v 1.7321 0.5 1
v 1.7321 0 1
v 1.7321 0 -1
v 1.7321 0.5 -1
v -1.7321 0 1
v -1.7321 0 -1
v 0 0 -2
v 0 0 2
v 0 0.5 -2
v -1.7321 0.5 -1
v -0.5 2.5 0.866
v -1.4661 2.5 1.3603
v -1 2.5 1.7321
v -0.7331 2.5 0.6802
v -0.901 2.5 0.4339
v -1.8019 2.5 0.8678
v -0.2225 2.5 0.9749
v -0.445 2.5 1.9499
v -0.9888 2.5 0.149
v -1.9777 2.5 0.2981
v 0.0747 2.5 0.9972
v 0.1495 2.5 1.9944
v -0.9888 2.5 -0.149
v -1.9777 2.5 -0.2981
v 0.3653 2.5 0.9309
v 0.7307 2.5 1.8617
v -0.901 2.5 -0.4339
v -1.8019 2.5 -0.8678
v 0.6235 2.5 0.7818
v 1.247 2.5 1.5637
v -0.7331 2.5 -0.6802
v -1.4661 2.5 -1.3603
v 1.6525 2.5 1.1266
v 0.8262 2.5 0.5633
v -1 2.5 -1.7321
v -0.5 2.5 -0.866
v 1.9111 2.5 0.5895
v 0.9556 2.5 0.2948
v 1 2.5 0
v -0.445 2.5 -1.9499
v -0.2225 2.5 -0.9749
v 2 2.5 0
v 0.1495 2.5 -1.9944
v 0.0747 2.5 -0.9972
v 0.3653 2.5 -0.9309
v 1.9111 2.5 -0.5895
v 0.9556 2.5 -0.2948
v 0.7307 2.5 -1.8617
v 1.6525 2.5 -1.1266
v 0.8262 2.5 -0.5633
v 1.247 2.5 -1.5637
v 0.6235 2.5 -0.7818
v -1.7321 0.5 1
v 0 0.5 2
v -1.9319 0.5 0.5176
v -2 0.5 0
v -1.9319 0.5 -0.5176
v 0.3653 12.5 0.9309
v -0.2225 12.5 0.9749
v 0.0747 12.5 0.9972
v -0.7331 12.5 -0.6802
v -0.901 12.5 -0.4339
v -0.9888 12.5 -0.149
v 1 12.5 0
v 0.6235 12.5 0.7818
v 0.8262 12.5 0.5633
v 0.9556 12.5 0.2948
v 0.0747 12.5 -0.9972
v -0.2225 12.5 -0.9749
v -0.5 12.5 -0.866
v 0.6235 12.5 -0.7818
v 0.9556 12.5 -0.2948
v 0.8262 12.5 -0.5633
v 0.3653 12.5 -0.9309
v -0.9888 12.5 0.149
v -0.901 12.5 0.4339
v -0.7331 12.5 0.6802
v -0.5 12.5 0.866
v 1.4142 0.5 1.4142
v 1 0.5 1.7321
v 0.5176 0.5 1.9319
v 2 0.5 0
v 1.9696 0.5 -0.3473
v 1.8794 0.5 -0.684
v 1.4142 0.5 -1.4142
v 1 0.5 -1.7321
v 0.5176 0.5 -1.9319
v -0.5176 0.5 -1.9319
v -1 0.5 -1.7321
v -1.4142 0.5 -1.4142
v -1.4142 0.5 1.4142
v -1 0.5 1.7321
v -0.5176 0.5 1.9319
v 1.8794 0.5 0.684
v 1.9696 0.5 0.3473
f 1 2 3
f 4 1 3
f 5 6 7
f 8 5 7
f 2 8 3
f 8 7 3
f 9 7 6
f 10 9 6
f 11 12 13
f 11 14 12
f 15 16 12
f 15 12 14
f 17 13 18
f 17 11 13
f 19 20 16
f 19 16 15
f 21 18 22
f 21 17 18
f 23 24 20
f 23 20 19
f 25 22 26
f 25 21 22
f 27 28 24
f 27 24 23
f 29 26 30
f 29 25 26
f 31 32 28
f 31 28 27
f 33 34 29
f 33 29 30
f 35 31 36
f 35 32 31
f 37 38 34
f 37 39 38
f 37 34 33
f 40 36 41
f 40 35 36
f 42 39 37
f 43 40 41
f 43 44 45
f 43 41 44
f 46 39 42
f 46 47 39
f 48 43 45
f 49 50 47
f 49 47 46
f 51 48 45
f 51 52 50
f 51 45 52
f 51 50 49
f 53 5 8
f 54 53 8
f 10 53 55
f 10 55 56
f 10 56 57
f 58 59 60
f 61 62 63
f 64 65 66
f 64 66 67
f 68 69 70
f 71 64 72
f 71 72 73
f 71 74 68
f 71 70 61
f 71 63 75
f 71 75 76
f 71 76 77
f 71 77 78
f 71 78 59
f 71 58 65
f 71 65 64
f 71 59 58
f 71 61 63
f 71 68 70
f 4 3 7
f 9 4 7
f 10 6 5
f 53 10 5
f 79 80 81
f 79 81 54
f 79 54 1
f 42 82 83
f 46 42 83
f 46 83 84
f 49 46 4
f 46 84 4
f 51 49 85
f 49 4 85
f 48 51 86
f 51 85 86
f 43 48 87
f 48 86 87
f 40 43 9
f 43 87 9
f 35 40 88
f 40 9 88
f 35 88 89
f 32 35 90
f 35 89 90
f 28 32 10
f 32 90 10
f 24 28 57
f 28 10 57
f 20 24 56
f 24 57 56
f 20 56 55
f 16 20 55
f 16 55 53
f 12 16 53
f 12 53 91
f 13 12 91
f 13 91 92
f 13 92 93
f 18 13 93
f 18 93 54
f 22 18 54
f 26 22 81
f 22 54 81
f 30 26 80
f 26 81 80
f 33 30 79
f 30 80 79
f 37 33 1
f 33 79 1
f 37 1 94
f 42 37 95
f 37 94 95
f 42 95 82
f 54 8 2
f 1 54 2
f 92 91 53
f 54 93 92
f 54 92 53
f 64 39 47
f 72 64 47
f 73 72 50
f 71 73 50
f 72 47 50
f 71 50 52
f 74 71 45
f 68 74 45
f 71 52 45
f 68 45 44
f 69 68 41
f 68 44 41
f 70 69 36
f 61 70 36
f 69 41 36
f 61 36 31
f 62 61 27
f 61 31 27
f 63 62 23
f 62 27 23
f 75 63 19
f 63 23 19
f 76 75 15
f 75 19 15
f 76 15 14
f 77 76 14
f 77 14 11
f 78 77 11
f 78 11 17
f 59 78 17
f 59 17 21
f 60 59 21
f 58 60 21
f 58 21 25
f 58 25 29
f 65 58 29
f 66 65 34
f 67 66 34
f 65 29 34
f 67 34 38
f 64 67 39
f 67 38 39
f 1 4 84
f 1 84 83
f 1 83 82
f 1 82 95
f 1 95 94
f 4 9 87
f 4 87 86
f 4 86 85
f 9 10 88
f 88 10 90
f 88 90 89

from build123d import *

# Parameters (mm, degrees)
SKETCH1_R           = 2
BOSS_EXTRUDE1_DEPTH = 2.5
SKETCH2_R           = 1
BOSS_EXTRUDE2_DEPTH = 10
CUT_EXTRUDE3_DEPTH  = 0.5


with BuildPart() as part:
    # Sketch1 → Boss-Extrude1 (new body)
    with BuildSketch(Plane(origin=(0, 0, 0), x_dir=(1, 0, 0), z_dir=(0, 1, 0))):
        Circle(SKETCH1_R)
    extrude(amount=BOSS_EXTRUDE1_DEPTH)

    # Sketch2 → Boss-Extrude2 (add)
    with BuildSketch(Plane(origin=(0, 2.5, 0), x_dir=(1, 0, 0), z_dir=(0, 1, 0))):
        Circle(SKETCH2_R)
    extrude(amount=BOSS_EXTRUDE2_DEPTH)

    # Sketch3 → Cut-Extrude3 (cut)
    with BuildSketch(Plane.XZ):
        with BuildLine():
            Line((-1.732050808, 1), (0, 2))
            ThreePointArc((0, 2), (-1, 1.732050808), (-1.732050808, 1))
        make_face()
        with BuildLine():
            Line((-1.732050808, -1), (-1.732050808, 1))
            ThreePointArc((-1.732050808, 1), (-2, 0), (-1.732050808, -1))
        make_face()
        with BuildLine():
            Line((0, -2), (-1.732050808, -1))
            ThreePointArc((-1.732050808, -1), (-1, -1.732050808), (0, -2))
        make_face()
        with BuildLine():
            ThreePointArc((0, -2), (1, -1.732050808), (1.732050808, -1))
            Line((1.732050808, -1), (0, -2))
        make_face()
        with BuildLine():
            ThreePointArc((2, 0), (1.931851653, 0.51763809), (1.732050808, 1))
            Line((1.732050808, 1), (1.732050808, -1))
            ThreePointArc((1.732050808, -1), (1.931851653, -0.51763809), (2, 0))
        make_face()
        with BuildLine():
            ThreePointArc((1.732050808, 1), (1, 1.732050808), (0, 2))
            Line((0, 2), (1.732050808, 1))
        make_face()
    extrude(amount=-CUT_EXTRUDE3_DEPTH, mode=Mode.SUBTRACT)


solid = part.part
